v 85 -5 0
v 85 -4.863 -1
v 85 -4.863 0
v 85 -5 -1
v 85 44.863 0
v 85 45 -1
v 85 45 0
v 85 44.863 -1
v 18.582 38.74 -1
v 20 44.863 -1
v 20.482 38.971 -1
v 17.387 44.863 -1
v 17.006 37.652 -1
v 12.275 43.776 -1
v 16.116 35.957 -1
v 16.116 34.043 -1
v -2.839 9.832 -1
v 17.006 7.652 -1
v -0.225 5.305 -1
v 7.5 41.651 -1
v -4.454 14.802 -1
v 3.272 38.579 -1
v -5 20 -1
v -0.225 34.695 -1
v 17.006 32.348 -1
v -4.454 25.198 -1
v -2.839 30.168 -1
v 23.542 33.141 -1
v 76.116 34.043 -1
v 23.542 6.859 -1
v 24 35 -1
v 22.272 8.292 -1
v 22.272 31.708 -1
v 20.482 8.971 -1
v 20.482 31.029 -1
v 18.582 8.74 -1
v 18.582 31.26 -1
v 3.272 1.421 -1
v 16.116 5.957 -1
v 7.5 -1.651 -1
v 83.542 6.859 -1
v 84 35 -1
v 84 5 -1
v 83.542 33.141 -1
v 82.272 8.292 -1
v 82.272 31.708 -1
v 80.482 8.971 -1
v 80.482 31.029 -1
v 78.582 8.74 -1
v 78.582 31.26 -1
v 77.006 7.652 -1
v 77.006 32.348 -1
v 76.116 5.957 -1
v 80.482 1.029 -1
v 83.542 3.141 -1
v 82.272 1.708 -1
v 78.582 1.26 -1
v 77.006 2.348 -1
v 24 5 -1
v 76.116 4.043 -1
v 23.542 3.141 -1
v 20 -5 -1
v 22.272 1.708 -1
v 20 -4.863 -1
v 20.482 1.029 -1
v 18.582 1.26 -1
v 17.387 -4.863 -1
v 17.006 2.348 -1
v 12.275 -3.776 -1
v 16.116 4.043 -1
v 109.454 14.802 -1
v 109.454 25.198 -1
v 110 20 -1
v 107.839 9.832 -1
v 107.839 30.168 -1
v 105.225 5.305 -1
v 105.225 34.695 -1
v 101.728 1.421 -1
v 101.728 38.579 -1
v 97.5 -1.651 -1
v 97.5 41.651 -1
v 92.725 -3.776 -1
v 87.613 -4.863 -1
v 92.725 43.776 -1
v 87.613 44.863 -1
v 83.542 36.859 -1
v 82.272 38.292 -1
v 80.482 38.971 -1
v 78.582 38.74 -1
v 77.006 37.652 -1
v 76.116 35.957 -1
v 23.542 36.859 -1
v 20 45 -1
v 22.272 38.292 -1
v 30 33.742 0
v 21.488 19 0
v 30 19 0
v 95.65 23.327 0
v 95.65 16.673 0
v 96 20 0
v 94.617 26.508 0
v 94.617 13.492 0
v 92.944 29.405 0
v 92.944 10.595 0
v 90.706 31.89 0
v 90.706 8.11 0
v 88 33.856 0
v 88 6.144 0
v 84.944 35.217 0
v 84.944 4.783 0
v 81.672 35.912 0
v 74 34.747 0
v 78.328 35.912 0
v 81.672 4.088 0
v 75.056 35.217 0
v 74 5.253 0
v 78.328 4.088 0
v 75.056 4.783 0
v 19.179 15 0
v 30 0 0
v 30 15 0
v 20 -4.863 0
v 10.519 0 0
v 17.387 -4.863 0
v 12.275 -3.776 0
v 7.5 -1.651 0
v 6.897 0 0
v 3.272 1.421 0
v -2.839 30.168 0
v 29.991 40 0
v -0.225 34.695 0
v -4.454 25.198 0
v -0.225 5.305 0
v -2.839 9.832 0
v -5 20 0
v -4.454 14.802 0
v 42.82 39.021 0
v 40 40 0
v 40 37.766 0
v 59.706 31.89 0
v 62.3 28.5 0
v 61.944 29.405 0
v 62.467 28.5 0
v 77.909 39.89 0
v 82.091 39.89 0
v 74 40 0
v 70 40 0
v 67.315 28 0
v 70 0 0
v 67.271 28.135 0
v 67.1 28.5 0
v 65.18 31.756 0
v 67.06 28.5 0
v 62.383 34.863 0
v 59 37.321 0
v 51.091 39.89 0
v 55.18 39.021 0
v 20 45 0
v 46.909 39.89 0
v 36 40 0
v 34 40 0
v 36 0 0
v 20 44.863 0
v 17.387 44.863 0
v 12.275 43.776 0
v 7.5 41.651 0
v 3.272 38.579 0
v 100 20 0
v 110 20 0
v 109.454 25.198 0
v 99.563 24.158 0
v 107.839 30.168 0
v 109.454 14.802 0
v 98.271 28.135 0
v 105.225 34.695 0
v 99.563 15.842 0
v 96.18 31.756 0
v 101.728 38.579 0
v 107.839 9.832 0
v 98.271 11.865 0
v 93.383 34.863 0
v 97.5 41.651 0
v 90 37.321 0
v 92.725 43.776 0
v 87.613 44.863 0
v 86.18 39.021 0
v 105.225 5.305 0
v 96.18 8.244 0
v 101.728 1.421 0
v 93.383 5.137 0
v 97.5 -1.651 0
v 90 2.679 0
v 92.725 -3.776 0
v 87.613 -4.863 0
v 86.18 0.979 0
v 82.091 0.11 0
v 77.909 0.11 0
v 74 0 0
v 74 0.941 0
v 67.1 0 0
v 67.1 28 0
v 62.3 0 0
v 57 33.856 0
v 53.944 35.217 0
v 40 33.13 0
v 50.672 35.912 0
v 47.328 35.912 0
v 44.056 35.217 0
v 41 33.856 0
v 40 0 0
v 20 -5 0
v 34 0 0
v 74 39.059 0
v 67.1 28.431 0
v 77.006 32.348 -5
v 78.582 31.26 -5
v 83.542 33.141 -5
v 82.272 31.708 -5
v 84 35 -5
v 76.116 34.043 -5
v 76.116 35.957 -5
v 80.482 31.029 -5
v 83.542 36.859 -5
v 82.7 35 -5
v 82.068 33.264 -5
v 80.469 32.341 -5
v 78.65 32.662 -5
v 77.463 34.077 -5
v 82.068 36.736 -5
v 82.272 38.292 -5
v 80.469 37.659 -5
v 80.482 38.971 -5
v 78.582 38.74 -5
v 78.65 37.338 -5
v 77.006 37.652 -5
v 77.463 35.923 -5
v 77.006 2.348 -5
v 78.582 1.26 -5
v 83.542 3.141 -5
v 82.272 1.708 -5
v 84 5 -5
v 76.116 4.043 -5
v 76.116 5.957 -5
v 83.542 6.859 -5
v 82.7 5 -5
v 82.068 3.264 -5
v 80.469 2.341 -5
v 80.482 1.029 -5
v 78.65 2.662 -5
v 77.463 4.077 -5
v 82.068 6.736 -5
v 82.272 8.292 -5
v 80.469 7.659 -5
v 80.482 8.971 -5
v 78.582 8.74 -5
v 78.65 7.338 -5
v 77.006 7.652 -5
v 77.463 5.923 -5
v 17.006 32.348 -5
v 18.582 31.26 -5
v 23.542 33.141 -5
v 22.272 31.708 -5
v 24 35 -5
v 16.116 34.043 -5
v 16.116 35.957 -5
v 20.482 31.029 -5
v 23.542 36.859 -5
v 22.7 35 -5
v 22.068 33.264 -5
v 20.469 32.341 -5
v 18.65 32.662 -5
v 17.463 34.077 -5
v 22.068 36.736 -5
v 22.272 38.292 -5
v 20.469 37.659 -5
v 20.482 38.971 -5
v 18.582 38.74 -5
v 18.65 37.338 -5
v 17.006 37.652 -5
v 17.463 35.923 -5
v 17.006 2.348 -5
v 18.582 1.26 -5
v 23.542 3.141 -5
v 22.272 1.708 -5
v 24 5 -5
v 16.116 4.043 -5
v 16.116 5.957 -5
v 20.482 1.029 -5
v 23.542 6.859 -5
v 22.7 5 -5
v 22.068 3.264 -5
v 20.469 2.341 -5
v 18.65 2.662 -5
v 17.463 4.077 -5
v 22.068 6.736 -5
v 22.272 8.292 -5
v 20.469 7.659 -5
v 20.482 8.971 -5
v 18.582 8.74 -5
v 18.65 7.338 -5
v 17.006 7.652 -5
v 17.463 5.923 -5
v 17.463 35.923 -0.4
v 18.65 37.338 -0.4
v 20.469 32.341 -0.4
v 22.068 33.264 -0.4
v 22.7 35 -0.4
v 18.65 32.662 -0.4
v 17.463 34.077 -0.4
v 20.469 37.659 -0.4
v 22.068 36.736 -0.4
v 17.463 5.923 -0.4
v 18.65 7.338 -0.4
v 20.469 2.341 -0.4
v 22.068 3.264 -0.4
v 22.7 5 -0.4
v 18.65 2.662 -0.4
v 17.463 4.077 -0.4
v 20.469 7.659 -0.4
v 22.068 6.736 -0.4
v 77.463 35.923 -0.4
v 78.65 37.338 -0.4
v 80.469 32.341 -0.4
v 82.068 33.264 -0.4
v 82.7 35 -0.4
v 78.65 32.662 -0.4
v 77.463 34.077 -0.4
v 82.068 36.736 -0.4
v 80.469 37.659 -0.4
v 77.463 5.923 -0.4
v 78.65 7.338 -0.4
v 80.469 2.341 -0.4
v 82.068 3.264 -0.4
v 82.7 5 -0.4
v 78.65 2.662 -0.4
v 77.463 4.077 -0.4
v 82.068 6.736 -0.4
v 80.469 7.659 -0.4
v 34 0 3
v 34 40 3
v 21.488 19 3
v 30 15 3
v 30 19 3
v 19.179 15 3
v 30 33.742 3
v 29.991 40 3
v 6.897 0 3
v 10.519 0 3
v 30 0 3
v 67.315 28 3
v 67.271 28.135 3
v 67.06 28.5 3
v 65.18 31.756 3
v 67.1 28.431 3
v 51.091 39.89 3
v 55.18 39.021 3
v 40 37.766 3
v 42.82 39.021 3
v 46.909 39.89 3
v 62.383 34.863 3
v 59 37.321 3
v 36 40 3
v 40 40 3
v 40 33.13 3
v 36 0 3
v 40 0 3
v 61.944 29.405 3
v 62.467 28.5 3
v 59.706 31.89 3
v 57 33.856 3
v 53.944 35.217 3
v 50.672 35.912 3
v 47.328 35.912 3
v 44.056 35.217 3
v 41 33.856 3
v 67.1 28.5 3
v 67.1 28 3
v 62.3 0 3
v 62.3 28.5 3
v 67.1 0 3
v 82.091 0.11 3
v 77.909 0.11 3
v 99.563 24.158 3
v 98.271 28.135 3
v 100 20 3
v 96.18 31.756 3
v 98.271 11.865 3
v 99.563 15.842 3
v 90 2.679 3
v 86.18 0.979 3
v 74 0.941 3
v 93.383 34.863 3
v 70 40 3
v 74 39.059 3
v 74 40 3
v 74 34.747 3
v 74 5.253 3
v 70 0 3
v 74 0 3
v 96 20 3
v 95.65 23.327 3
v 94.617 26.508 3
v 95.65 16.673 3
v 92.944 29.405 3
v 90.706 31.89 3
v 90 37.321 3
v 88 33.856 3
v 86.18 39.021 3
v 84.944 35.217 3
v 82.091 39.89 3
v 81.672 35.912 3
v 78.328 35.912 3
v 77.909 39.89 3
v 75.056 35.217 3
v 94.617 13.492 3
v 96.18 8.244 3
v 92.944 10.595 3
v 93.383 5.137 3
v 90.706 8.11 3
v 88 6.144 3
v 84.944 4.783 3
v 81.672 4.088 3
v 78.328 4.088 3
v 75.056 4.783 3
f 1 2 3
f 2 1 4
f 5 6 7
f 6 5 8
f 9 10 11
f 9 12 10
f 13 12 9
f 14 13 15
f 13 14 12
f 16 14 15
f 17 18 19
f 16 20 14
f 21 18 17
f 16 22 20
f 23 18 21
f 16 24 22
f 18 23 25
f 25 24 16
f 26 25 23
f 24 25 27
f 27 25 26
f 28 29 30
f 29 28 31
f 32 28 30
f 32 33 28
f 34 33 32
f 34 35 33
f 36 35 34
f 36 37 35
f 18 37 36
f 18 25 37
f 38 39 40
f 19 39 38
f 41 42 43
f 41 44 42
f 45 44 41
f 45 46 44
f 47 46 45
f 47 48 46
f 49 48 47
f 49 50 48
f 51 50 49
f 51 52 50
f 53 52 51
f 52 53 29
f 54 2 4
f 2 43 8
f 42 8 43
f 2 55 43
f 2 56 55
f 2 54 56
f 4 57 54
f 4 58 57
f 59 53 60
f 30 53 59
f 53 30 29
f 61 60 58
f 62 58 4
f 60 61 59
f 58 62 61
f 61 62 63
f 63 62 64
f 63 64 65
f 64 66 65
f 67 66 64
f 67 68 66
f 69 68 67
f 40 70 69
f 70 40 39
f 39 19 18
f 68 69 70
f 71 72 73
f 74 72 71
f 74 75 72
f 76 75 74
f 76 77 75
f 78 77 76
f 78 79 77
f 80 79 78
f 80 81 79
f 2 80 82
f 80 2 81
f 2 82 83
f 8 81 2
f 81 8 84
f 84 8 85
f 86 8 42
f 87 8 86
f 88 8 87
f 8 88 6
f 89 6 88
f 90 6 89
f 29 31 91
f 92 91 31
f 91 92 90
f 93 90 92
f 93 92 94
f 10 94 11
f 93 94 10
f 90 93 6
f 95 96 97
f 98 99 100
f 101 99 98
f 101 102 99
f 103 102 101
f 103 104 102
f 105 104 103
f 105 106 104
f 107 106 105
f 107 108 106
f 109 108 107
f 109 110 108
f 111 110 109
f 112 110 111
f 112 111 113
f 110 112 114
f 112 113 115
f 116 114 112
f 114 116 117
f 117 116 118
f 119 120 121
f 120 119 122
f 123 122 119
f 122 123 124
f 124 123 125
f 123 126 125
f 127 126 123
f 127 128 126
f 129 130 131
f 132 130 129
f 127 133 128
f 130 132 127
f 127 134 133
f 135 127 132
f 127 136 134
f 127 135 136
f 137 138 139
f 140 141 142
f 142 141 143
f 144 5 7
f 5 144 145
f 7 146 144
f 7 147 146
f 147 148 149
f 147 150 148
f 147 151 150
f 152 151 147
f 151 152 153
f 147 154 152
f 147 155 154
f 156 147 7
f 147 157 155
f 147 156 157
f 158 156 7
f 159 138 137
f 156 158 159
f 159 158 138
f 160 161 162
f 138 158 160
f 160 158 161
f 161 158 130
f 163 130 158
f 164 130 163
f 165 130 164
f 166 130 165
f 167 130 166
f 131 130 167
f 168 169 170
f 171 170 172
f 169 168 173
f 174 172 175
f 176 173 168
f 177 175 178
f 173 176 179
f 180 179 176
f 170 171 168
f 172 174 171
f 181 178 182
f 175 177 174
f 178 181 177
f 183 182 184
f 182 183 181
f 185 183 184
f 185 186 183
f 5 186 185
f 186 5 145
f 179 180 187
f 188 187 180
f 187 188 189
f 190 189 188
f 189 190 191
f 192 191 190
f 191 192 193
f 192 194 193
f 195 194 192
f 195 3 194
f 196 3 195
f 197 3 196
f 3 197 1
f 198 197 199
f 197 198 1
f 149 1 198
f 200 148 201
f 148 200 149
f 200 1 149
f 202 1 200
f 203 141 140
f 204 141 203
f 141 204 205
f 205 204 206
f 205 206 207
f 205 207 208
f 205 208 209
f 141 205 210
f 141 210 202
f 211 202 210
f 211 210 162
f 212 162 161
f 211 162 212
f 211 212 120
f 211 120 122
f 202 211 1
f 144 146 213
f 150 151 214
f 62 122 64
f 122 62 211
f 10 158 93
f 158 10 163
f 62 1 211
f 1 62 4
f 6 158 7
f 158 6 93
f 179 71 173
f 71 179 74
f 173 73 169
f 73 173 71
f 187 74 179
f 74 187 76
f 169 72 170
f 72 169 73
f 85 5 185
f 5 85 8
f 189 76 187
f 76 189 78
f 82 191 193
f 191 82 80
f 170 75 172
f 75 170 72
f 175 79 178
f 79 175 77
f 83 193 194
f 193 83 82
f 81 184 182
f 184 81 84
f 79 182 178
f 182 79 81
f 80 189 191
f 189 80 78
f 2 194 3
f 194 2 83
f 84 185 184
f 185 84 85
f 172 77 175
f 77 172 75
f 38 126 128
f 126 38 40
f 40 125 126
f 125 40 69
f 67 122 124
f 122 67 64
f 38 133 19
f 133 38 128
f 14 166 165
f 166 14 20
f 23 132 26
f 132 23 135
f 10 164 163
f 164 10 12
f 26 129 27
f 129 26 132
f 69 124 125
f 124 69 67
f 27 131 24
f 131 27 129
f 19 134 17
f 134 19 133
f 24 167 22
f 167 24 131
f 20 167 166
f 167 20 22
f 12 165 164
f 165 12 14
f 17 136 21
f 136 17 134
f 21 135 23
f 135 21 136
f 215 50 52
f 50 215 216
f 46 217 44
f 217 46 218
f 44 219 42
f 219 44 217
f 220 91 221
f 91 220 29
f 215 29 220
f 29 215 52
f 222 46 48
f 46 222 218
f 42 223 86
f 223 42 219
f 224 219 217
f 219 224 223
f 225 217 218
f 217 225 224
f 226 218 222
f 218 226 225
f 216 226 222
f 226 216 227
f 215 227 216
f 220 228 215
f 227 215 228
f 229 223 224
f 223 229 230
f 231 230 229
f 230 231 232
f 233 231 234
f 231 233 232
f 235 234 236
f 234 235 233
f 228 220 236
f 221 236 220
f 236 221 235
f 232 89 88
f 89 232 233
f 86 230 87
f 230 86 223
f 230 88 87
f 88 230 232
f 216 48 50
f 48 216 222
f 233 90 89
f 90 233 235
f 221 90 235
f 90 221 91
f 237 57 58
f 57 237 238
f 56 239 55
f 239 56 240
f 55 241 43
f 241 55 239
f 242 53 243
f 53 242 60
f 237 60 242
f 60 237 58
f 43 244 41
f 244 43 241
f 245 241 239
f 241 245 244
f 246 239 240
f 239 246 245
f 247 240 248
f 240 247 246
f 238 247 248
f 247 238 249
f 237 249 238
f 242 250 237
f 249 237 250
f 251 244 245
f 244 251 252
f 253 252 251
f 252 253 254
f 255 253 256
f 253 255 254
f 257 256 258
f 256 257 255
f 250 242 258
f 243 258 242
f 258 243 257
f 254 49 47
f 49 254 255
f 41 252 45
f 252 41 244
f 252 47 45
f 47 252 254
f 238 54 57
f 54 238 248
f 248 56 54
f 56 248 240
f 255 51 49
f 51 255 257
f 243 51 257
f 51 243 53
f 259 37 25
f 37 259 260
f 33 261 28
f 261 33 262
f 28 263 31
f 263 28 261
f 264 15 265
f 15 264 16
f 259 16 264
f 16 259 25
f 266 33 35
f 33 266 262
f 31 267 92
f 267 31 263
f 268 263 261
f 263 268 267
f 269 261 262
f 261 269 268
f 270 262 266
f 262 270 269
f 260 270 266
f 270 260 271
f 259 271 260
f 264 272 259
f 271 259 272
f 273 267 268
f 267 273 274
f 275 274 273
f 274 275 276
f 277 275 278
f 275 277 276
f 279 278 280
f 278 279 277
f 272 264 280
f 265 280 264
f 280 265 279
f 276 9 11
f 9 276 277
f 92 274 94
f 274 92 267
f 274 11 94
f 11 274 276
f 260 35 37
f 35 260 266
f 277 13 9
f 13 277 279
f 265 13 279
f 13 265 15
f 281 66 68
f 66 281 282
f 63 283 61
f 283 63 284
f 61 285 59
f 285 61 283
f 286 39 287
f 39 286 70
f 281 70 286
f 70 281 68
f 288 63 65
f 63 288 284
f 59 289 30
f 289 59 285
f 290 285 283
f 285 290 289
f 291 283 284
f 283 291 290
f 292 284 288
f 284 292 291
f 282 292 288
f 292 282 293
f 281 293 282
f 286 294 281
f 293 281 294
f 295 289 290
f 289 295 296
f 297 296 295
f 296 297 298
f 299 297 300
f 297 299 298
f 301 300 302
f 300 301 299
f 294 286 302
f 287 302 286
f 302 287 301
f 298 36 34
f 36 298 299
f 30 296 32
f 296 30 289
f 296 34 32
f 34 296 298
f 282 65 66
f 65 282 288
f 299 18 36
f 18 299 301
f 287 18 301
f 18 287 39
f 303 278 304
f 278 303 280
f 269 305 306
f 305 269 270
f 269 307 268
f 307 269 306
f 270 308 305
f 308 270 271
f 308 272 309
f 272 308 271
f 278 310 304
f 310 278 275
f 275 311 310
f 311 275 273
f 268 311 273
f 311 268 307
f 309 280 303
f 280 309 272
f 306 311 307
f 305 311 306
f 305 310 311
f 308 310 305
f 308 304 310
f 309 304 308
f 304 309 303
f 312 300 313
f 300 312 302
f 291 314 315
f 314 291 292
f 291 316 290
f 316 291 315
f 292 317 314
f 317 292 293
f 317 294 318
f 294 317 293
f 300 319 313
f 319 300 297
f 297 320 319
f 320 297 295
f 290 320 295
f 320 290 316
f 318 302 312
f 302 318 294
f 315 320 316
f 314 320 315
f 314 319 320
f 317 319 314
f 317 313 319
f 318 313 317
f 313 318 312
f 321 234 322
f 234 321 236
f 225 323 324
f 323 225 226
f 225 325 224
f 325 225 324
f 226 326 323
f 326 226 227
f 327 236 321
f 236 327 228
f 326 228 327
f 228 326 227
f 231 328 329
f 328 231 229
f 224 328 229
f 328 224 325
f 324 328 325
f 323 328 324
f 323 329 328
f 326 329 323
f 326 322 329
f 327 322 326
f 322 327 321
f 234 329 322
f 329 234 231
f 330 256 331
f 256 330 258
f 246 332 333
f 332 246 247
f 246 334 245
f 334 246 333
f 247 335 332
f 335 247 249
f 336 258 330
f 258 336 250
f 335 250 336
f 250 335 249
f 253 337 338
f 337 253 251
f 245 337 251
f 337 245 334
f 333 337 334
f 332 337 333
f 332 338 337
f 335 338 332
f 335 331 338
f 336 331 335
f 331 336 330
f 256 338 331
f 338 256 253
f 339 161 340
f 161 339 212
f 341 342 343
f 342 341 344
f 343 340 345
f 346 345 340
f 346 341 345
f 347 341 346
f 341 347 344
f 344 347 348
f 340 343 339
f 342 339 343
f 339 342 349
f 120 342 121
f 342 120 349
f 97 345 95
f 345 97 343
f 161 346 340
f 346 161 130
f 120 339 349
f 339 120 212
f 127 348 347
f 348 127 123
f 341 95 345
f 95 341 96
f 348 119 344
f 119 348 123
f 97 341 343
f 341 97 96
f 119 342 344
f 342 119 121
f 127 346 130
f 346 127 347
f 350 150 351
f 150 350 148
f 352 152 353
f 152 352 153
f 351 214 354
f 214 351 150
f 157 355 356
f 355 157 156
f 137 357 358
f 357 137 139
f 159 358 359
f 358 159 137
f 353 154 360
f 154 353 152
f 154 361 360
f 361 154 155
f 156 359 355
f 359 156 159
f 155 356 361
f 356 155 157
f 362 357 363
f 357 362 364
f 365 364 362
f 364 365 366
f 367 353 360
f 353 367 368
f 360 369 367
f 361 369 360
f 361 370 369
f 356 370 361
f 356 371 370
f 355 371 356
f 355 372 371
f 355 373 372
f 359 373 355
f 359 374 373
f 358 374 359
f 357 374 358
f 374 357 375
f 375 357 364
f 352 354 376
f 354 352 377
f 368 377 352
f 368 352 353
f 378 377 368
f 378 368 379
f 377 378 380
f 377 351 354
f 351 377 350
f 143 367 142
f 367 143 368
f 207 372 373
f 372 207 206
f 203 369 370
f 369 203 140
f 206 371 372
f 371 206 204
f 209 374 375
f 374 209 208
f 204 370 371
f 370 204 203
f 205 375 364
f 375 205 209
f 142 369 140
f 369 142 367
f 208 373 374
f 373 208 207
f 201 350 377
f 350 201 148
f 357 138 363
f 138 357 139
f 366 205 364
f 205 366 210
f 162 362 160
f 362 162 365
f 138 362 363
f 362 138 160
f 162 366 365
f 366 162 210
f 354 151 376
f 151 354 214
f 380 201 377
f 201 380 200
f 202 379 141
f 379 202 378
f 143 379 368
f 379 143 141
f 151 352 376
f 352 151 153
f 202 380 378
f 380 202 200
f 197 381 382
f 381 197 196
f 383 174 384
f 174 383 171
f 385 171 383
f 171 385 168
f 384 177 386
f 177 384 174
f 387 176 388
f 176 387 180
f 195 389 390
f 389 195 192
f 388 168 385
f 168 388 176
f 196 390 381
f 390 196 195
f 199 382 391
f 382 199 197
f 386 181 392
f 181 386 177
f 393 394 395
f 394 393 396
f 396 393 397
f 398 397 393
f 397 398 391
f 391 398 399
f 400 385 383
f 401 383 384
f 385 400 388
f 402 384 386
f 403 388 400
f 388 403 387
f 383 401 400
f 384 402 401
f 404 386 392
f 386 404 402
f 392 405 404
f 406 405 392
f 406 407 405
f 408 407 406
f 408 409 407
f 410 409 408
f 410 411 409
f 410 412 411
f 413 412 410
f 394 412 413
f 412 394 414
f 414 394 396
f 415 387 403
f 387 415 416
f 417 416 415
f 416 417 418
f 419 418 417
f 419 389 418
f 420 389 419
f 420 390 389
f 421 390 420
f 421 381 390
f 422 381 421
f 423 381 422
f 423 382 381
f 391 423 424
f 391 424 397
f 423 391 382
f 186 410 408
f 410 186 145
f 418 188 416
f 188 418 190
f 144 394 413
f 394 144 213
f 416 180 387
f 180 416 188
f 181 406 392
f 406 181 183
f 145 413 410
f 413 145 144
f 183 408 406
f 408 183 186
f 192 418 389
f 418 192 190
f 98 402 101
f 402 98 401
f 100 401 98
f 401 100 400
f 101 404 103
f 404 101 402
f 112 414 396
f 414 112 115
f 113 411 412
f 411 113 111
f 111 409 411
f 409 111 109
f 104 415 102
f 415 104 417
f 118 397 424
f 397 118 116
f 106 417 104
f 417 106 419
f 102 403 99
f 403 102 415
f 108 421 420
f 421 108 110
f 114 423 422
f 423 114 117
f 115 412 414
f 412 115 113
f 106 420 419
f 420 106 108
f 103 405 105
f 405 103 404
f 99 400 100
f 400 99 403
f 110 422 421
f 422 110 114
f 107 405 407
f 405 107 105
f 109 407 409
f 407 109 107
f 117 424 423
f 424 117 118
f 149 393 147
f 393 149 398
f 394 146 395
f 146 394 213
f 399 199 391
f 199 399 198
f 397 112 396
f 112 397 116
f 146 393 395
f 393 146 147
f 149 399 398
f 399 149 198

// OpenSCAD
//основa
union(){
 rotate([0,900,180]) translate([20,-45,0])
difference(){  
 union(){  
  cube([65,50,1]);
   translate([65,25,0]) cylinder(1,25,25);
    translate([0,25,0]) cylinder(1,25,25);
  
  translate([60,10,0]) cylinder(5,4,4);
  translate([60,40,0]) cylinder(5,4,4);
  translate([0,10,0]) cylinder(5,4,4);
  translate([0,40,0]) cylinder(5,4,4);
}
  

  #translate([0,10,0.4]) cylinder(5,2.7,2.7);
  #translate([0,40,0.4]) cylinder(5,2.7,2.7);
  




  #translate([60,10,0.4]) cylinder(5,2.7,2.7);
  #translate([60,40,0.4]) cylinder(5,2.7,2.7);

  }


}

//буква a
translate([30,0,0])
union(){
    difference(){
union(){
 cube([4,40,3]);
 translate([-24.1,0,0]) rotate([0,0,-30])  cube([4,50,3]);
 translate([-15,15,0]) cube([20,4,3]);
}
 translate([-40,-8,-1]) cube([60,8,5]);
 translate([4,0,-1]) cube([10,40,5]);
 translate([-34.65,0,-1]) rotate([0,0,-30]) cube([10,70,5]);
 translate([-1,40,-1]) cube(10);
}
}  


//буква n
translate([19,0,0]){
union(){
translate([17,0,0]) cube([4,40,3]);
difference(){
translate([30,20,0]) cylinder(3,20,20);
translate([30,20,0]) cylinder(5,16,16);
translate([10,-2,0]) cube([40,30,4]);
translate([10,0,0]) cube([10,40,4]);
}
translate([43.3,0,0]) cube([4.8,28.5,3]);
}
}
//буква d
translate([75,0,0])
union(){
 translate([-5,0,0]) cube([4,40,3]);
difference(){
 translate([5,20,0]) cylinder(3,20,20);
 translate([5,20,-1]) cylinder(5,16,16);
 translate([-15,0,-1]) cube([10,40,5]);
}

}
